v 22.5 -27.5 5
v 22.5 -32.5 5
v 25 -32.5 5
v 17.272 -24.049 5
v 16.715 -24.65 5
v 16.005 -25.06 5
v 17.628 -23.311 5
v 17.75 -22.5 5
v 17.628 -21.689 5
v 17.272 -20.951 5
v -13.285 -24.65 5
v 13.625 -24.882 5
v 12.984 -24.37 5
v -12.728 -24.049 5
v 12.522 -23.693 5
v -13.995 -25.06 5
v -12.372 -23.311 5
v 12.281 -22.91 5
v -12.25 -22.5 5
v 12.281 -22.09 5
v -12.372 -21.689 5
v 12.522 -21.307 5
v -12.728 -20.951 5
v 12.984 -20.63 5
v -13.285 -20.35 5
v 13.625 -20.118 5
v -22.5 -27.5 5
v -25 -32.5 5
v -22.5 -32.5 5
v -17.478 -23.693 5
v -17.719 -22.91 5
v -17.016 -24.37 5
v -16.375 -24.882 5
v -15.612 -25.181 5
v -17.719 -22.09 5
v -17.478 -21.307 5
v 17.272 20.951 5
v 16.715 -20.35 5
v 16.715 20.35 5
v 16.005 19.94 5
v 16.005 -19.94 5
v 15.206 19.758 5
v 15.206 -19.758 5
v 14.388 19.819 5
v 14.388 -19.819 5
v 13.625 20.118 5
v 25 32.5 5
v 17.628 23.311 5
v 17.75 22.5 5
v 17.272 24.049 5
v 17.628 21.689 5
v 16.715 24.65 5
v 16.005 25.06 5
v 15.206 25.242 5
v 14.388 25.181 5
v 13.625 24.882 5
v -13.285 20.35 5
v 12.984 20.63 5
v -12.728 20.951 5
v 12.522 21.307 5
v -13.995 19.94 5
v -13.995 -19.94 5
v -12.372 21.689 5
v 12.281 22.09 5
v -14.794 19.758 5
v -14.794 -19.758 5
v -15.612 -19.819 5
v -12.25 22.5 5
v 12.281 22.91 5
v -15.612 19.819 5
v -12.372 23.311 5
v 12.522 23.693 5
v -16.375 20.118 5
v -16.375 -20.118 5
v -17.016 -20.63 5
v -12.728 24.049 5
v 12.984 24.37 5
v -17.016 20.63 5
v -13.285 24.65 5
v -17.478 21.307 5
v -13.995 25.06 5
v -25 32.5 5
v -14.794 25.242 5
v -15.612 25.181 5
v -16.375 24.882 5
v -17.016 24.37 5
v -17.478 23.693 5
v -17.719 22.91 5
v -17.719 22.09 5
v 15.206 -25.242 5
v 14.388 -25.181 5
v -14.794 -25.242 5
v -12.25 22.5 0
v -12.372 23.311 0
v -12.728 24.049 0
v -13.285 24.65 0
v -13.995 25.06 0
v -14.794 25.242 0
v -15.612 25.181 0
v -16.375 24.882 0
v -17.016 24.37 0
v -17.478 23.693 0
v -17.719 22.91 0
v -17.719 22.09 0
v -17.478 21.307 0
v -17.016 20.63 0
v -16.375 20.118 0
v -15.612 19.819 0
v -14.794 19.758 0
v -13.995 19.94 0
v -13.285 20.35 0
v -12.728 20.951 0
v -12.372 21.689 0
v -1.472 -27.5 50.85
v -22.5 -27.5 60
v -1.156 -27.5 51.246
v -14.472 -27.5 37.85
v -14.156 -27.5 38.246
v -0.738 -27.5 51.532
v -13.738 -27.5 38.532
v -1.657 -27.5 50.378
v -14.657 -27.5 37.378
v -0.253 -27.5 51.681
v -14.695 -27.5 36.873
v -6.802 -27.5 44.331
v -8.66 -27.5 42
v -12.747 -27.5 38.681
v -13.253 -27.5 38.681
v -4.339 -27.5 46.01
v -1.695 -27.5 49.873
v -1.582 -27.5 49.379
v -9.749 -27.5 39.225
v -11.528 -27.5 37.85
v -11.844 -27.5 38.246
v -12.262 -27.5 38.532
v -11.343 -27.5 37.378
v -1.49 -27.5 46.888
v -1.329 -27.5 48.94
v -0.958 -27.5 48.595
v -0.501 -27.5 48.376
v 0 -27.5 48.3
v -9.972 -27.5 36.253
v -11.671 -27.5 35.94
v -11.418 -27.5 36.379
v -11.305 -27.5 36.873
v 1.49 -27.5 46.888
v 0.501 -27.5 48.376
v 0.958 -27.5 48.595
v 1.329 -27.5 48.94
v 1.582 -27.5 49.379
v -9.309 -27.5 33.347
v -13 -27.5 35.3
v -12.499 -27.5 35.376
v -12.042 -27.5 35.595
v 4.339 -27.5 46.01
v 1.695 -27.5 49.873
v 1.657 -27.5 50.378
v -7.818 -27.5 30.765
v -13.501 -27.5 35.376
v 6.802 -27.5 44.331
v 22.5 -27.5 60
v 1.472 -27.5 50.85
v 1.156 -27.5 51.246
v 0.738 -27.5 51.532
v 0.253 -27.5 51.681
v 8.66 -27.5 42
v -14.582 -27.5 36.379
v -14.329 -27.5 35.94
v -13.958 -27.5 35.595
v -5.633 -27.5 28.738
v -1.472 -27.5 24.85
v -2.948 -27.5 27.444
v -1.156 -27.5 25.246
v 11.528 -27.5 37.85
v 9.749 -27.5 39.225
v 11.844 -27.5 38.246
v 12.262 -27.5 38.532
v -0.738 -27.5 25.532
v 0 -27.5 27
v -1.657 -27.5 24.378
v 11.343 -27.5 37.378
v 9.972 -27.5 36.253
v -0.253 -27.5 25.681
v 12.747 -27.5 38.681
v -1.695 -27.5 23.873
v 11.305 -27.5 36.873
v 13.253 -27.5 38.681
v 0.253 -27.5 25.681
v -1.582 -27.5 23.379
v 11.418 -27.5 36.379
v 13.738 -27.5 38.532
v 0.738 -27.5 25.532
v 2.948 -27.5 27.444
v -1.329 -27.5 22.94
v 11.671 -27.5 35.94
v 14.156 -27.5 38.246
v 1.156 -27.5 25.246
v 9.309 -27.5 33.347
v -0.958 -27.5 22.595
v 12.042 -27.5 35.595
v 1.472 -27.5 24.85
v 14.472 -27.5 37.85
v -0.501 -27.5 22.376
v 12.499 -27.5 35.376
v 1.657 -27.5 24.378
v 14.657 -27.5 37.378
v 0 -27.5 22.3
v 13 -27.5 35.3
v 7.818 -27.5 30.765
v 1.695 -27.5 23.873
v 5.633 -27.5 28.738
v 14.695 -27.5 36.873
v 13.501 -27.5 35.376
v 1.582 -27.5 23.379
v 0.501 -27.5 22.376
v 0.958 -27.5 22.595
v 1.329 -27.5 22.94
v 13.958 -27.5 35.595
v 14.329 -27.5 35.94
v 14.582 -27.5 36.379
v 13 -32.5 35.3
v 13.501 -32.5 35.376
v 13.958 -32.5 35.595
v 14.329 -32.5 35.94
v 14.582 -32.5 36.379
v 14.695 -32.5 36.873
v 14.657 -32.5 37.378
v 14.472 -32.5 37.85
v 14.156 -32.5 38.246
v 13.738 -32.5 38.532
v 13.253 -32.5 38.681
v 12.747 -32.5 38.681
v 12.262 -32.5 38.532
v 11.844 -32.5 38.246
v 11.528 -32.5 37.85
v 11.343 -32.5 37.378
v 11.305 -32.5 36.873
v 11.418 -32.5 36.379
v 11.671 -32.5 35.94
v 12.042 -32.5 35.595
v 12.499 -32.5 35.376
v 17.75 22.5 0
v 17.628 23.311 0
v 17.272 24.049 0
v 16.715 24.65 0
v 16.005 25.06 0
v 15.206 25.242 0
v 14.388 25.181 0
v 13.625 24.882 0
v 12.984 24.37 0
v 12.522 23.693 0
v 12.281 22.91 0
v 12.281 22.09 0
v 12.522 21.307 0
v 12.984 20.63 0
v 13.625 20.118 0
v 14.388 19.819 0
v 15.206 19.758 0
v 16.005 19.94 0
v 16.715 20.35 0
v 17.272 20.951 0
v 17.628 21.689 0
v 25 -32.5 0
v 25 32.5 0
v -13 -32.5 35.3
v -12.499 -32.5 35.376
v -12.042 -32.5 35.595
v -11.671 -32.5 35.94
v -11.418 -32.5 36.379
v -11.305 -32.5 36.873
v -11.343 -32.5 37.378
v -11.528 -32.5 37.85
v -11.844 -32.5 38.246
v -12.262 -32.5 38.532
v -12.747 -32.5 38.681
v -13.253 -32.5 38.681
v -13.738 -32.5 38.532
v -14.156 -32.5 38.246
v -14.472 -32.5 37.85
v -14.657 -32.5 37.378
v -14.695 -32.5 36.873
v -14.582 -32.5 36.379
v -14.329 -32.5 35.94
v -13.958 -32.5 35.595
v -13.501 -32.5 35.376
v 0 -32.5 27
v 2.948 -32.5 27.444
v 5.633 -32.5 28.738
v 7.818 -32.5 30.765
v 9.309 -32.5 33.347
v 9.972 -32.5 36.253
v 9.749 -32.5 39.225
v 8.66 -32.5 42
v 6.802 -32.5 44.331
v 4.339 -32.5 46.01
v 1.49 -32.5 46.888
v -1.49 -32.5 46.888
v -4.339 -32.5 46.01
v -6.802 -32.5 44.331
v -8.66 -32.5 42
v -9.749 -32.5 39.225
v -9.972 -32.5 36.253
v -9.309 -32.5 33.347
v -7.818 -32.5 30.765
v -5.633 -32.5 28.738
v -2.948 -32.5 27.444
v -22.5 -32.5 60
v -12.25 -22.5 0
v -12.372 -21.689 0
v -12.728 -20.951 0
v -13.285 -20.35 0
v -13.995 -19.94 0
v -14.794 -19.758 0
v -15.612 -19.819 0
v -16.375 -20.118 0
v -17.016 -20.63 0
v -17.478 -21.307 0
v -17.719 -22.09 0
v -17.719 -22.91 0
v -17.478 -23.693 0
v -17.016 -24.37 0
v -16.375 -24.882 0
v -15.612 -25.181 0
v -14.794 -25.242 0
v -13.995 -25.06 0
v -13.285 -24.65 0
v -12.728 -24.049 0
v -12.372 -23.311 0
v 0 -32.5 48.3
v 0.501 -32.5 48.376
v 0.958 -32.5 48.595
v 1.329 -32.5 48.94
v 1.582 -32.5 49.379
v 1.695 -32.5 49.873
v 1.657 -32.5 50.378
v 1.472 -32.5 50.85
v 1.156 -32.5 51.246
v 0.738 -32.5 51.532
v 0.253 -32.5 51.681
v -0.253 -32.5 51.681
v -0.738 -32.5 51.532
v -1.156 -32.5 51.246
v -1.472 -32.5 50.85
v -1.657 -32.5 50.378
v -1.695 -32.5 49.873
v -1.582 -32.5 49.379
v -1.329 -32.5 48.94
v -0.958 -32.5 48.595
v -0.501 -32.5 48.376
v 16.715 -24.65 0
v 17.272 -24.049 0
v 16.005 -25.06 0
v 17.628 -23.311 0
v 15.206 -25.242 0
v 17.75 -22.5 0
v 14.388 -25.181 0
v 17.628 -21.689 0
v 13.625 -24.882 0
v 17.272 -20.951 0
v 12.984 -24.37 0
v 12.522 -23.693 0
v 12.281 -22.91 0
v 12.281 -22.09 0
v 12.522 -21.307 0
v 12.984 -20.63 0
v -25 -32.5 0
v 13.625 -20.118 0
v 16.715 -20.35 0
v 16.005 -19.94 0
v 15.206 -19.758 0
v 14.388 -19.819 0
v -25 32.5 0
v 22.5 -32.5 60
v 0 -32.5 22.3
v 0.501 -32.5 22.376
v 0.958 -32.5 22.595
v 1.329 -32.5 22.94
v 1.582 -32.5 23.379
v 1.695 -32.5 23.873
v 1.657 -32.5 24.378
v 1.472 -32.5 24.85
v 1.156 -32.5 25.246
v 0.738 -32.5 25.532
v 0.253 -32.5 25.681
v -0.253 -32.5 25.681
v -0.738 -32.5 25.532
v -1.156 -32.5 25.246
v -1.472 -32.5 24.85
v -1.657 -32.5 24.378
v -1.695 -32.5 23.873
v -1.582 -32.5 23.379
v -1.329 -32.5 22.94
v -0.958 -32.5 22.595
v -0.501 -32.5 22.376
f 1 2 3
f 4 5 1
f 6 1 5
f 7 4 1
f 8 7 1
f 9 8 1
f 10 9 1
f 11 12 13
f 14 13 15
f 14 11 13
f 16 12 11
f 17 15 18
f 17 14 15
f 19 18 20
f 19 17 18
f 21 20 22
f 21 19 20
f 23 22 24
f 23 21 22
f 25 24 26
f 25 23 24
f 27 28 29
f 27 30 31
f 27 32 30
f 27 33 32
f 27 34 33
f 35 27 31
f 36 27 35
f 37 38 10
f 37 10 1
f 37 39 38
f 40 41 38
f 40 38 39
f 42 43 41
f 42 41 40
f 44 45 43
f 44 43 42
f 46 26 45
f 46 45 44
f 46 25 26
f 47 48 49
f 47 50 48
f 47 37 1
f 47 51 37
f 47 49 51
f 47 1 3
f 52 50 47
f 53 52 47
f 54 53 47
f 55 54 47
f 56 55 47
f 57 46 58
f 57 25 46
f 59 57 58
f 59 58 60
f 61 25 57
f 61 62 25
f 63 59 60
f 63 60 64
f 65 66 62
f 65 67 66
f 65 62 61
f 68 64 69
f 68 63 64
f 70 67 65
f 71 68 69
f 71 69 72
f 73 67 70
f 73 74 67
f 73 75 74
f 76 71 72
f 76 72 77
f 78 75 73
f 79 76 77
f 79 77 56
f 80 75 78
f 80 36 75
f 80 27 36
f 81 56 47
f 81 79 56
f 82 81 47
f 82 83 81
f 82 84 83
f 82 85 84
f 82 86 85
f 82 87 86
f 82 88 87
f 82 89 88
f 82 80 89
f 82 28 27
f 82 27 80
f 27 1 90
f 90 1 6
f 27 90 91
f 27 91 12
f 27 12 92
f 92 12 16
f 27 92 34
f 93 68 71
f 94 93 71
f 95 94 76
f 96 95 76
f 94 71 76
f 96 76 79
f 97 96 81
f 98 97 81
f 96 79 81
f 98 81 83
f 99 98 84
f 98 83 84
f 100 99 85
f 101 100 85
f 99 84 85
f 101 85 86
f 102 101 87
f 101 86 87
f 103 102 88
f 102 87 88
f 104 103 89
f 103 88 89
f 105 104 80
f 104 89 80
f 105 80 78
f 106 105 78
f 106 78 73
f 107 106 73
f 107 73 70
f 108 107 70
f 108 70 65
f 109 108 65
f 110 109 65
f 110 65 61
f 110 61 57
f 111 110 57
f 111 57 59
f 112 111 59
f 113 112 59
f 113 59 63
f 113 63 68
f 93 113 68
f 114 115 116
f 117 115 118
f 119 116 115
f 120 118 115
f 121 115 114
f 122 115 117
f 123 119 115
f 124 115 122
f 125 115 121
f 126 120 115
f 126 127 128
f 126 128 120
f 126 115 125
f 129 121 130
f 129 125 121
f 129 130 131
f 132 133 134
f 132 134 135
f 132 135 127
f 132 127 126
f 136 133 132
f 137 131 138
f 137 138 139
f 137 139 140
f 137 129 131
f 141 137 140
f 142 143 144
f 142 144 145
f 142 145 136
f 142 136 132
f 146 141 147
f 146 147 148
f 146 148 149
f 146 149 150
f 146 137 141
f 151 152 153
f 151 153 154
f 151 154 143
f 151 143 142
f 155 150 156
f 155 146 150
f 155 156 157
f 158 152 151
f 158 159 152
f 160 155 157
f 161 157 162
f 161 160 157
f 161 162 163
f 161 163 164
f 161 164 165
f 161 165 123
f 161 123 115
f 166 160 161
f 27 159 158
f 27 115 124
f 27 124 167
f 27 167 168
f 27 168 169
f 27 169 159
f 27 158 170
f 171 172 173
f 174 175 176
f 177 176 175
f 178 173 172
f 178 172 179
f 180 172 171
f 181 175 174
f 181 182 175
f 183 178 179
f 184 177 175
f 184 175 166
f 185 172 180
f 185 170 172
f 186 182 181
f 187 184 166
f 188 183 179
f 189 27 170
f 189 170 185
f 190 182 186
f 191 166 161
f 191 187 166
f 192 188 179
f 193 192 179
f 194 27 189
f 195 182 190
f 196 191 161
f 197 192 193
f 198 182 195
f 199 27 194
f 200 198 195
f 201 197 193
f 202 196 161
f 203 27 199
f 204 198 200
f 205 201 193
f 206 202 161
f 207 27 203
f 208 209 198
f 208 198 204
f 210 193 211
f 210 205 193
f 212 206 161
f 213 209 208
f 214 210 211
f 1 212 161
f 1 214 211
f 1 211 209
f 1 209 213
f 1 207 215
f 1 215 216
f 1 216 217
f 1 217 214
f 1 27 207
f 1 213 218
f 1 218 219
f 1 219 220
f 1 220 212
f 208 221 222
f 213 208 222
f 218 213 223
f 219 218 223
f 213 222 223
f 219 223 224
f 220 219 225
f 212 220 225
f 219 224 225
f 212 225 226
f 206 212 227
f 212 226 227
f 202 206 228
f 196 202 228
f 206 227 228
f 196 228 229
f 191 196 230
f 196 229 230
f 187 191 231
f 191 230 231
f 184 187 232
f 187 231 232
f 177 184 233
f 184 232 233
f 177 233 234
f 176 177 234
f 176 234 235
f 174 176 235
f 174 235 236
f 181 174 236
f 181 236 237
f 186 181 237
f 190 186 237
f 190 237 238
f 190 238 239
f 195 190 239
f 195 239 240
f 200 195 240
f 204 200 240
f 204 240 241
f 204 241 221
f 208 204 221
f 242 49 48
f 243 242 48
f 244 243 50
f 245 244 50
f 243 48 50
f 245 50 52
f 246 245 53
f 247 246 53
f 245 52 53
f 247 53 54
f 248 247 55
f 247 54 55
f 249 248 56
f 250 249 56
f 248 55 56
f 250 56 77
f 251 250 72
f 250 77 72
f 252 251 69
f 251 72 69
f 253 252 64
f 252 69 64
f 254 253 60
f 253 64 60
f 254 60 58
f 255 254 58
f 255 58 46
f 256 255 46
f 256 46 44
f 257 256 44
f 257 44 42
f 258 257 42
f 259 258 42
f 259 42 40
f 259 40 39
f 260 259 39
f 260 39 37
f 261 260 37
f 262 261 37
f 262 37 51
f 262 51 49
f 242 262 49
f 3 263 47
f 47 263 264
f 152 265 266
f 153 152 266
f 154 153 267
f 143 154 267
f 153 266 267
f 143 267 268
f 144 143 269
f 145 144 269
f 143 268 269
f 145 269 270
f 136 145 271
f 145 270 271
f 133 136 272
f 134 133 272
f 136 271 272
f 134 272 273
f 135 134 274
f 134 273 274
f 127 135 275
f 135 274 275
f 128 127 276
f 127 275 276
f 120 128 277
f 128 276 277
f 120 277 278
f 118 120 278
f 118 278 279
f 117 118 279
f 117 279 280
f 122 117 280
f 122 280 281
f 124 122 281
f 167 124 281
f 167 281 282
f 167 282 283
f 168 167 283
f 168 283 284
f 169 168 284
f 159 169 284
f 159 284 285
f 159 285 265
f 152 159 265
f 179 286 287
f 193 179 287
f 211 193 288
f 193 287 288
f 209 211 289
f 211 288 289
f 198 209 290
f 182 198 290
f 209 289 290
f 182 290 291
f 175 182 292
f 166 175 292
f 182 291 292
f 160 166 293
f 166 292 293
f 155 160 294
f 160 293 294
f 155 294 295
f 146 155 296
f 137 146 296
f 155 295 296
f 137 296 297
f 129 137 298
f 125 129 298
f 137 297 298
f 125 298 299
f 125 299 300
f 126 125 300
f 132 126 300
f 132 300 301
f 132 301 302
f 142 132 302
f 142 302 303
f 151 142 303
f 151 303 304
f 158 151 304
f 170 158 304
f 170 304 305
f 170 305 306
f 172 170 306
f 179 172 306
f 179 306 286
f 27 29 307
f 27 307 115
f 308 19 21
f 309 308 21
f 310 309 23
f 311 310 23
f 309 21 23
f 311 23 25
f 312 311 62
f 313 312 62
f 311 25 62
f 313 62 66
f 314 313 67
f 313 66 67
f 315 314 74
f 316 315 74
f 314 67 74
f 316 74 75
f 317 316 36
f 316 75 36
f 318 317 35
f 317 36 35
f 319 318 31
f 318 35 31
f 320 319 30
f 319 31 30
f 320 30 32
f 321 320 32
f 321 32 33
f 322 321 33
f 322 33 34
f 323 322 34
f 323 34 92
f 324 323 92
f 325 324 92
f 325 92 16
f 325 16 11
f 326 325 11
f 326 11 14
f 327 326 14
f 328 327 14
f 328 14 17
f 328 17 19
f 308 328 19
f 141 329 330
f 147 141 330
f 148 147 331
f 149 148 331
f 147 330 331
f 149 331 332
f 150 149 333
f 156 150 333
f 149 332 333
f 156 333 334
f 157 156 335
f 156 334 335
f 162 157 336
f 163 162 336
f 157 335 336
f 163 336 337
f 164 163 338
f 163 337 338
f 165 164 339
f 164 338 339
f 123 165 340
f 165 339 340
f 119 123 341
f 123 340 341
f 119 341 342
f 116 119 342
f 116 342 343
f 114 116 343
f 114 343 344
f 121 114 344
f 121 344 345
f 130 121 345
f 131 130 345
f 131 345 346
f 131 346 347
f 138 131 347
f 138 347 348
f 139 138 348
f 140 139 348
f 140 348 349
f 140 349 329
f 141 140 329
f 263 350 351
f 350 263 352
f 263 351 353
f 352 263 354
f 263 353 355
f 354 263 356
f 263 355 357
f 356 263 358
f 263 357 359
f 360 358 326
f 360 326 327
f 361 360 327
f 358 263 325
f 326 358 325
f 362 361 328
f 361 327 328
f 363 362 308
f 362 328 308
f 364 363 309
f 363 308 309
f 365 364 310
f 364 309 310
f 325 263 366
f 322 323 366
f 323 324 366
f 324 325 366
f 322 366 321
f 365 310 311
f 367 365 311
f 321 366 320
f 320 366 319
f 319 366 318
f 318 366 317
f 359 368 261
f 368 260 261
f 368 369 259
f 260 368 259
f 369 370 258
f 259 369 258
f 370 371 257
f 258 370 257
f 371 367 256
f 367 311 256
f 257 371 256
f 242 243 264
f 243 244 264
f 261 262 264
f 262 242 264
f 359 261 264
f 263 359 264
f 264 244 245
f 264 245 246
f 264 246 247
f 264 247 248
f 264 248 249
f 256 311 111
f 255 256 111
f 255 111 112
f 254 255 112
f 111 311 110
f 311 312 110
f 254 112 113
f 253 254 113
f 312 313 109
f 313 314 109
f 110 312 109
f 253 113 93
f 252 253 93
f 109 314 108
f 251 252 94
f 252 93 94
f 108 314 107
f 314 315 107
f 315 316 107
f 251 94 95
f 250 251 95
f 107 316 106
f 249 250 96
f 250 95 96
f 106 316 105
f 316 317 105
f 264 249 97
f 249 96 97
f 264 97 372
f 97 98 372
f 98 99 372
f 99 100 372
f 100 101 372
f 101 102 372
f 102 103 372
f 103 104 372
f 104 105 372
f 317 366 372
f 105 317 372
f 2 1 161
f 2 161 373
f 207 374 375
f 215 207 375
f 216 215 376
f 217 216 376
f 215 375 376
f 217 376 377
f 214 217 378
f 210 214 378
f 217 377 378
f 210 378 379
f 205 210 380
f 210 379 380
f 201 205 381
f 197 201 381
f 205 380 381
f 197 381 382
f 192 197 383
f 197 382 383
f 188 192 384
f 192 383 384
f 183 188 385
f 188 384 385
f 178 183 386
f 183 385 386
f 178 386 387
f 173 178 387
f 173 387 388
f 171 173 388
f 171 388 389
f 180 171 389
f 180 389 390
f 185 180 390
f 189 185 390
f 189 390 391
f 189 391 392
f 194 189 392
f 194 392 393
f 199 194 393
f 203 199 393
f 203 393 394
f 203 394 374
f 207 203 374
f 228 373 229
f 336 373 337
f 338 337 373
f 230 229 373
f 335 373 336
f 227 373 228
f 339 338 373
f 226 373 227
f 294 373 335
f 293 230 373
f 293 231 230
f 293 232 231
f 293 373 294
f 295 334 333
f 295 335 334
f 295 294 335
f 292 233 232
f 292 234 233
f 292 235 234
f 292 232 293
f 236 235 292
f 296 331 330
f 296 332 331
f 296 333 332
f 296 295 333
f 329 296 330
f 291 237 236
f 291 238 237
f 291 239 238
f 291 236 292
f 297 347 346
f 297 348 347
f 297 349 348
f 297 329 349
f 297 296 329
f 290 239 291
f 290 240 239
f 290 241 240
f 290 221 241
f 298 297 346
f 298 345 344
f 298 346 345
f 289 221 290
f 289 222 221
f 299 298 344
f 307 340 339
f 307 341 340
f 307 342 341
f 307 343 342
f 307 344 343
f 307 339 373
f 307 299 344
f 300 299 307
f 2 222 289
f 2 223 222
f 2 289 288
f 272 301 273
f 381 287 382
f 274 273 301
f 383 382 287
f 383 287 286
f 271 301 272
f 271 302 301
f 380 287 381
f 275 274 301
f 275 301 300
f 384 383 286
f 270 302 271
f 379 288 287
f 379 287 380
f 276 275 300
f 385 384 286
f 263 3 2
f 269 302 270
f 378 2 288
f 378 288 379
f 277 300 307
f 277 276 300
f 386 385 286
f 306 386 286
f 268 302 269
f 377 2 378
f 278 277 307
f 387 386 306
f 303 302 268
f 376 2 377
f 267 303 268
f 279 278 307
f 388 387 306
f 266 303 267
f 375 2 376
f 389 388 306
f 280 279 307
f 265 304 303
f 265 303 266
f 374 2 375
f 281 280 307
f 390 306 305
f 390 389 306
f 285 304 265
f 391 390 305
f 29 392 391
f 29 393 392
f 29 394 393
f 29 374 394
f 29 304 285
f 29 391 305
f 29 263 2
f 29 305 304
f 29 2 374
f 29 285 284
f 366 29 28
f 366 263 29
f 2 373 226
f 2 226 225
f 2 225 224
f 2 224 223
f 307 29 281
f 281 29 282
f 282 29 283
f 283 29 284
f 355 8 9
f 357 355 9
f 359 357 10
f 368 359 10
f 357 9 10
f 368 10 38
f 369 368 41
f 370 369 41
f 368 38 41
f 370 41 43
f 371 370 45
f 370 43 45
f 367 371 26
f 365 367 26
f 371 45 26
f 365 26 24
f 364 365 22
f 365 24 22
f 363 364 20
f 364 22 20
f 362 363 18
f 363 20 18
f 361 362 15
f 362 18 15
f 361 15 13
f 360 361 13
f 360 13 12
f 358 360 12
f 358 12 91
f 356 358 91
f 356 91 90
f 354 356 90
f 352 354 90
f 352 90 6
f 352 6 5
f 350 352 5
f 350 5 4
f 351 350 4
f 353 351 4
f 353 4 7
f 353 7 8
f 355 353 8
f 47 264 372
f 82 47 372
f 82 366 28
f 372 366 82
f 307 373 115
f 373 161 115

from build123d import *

# Parameters (mm, degrees)
SKETCH1_W           = 65
SKETCH1_H           = 50
BOSS_EXTRUDE1_DEPTH = 5
BOSS_EXTRUDE2_DEPTH = 55
SKETCH3_R           = 10
CUT_EXTRUDE1_DEPTH  = 92.923881554
SKETCH5_R           = 1.7
CUT_EXTRUDE2_DEPTH  = 92.923881554
SKETCH6_R           = 2.75
CUT_EXTRUDE3_DEPTH  = 69.60211367


with BuildPart() as part:
    # Sketch1 → Boss-Extrude1 (new body)
    with BuildSketch(Plane(origin=(0, 0, 0), x_dir=(0, 1, 0), z_dir=(0, 0, 1))):
        Rectangle(SKETCH1_W, SKETCH1_H)
    extrude(amount=BOSS_EXTRUDE1_DEPTH)

    # Sketch2 → Boss-Extrude2 (add)
    with BuildSketch(Plane.XY.offset(5)):
        Polygon((0, -32.5), (-22.5, -32.5), (-22.5, -27.5), (22.5, -27.5), (22.5, -32.5), align=None)
    extrude(amount=BOSS_EXTRUDE2_DEPTH)

    # Sketch3 → Cut-Extrude1 (cut, through all)
    with BuildSketch(Plane.XZ.offset(32.5)):
        with Locations(Location((0, 37, 0), (0, 0, 270))):
            Circle(SKETCH3_R)
    extrude(amount=-CUT_EXTRUDE1_DEPTH, mode=Mode.SUBTRACT)

    # Sketch5 → Cut-Extrude2 (cut, through all)
    with BuildSketch(Plane.XZ.offset(32.5)):
        with Locations(Location((0, 50, 0), (0, 0, 270))):
            Circle(SKETCH5_R)
        with Locations(Location((13, 37, 0), (0, 0, 270))):
            Circle(SKETCH5_R)
        with Locations(Location((0, 24, 0), (0, 0, 270))):
            Circle(SKETCH5_R)
        with Locations(Location((-13, 37, 0), (0, 0, 270))):
            Circle(SKETCH5_R)
    extrude(amount=-CUT_EXTRUDE2_DEPTH, mode=Mode.SUBTRACT)

    # Sketch6 → Cut-Extrude3 (cut, through all)
    with BuildSketch(Plane.XY.offset(5)):
        with Locations((-15, 22.5)):
            Circle(SKETCH6_R)
        with Locations((15, 22.5)):
            Circle(SKETCH6_R)
        with Locations((-15, -22.5)):
            Circle(SKETCH6_R)
        with Locations((15, -22.5)):
            Circle(SKETCH6_R)
    extrude(amount=-CUT_EXTRUDE3_DEPTH, mode=Mode.SUBTRACT)


solid = part.part
